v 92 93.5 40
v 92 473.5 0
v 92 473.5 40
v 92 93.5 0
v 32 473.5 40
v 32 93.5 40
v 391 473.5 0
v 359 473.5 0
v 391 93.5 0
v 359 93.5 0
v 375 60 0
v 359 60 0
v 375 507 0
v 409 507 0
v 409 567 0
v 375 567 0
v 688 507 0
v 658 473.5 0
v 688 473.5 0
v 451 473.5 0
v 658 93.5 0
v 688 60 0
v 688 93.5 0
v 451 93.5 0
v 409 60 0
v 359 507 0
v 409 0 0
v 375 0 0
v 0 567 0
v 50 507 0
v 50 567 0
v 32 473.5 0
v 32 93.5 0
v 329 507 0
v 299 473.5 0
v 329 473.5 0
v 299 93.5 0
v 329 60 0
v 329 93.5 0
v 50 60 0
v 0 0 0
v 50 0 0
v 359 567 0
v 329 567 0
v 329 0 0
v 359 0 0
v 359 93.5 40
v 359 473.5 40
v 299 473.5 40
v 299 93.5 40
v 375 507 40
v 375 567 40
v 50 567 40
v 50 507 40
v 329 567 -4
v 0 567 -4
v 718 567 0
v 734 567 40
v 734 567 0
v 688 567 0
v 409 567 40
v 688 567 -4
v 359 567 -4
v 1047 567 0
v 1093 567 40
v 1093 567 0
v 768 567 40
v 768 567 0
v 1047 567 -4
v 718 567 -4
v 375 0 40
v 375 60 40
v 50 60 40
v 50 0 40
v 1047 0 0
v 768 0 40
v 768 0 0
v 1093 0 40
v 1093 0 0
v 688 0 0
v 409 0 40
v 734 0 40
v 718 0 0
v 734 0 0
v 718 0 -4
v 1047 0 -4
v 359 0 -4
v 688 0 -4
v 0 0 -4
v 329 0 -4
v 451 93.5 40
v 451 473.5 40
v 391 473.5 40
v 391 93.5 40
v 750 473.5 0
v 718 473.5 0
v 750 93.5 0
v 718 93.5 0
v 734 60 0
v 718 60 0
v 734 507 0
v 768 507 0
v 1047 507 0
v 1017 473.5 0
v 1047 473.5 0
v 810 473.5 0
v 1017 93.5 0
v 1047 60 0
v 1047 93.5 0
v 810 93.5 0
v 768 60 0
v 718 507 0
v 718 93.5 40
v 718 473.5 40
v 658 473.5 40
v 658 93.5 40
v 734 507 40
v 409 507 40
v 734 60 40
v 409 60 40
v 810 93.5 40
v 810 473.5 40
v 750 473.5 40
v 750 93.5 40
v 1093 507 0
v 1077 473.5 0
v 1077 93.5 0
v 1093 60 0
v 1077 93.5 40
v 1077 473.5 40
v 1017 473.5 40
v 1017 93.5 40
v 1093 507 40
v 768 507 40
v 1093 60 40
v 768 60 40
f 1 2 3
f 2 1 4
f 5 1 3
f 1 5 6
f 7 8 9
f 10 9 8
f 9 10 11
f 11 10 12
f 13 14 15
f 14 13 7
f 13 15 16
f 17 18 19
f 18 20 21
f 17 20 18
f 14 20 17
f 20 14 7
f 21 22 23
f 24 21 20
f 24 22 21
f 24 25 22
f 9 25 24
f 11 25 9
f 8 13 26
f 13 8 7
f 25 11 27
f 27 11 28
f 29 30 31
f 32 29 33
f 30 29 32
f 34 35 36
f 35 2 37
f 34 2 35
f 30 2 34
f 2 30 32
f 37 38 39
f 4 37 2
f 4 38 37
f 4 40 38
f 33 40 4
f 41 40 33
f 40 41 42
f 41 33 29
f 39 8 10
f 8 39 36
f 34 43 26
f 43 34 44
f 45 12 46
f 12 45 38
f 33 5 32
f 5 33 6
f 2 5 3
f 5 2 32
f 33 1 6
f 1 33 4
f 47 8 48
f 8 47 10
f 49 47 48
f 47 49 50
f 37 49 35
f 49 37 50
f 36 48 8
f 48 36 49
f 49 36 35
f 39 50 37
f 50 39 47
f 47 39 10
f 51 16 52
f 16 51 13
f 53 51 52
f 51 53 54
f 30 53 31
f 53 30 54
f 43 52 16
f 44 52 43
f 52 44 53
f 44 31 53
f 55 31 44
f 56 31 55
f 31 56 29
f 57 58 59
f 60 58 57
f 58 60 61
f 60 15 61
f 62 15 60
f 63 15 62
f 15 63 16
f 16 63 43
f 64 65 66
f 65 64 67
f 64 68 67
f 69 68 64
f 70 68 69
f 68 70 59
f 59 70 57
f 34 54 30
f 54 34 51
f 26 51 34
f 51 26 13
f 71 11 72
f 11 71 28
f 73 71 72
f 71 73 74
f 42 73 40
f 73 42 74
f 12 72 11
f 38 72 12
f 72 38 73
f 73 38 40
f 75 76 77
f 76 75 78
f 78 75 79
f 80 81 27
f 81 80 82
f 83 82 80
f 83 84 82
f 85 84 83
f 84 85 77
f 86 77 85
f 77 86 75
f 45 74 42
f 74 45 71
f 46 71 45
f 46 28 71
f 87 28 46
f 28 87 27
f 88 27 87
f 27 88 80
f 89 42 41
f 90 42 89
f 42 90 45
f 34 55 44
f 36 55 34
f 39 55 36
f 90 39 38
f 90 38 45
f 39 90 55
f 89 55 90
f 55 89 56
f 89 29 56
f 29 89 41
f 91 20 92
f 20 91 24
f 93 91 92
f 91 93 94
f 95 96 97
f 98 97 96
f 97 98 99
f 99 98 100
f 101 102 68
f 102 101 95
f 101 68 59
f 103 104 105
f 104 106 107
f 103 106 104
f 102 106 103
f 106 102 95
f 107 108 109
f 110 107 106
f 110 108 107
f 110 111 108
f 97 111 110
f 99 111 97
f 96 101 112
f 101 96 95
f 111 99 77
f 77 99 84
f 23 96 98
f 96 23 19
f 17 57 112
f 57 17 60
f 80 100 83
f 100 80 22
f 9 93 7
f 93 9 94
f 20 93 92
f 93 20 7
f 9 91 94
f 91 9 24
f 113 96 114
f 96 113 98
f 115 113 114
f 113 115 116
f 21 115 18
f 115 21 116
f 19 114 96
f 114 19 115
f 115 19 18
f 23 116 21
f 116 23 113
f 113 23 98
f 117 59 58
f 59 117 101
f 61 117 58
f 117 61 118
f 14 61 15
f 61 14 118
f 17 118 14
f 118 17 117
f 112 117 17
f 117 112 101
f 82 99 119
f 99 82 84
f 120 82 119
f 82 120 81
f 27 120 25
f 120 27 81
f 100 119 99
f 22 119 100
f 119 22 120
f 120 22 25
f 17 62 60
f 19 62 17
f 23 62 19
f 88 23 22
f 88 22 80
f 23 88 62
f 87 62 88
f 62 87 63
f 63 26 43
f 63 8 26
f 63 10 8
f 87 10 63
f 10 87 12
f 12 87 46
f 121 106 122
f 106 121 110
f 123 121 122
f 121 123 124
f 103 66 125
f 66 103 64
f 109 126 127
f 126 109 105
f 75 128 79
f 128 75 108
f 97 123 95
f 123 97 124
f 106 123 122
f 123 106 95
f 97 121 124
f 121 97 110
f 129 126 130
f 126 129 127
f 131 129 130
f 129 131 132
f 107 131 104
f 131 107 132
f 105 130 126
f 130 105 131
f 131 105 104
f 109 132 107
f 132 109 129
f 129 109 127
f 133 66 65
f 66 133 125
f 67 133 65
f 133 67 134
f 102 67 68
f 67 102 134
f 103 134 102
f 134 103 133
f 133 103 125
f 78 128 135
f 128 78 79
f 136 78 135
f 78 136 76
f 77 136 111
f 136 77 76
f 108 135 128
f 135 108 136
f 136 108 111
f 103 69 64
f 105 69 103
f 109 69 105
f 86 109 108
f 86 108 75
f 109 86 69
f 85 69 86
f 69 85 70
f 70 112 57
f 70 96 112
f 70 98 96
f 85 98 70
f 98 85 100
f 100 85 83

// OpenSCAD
// Schweißtisch geschlossen

p_h=4;
p_l=567;
p_b=329;

vkr_h=40;
vkr_l=380;
vkr_b=60;

vkrs_h=40;
vkrs_l=325; // <p_b 
vkrs_b=60;

overlap=50;
clear=2;
dist=30;

module mod() {
    // 1. bar
    translate([vkr_b/2+clear,(p_l-vkr_l)/2,0]) {
        color( "Yellow", 1.0 ) {
            cube([vkr_b,vkr_l,vkr_h], 0);
        };
    };
    
    // 2. bar
    translate([p_b-(vkr_b/2),(p_l-vkr_l)/2,0]) {
        color( "Lime", 1.0 ) {
            cube([vkr_b,vkr_l,vkr_h], 0);
        };
    };

    // 3. bar
    translate([overlap,p_l-vkrs_b,0]) {
        color( "ForestGreen", 1.0 ) {
            cube([vkrs_l,vkrs_b,vkrs_h], 0);
        };
    };
    
    // 4. bar
    translate([overlap,0,0]) {
        color( "Olive", 1.0 ) {
            cube([vkrs_l,vkrs_b,vkrs_h], 0);
        };
    };

    // Plate
    translate([0,0,-p_h]) {
        cube([p_b,p_l,p_h], 0);
    };
};

mod();

translate([p_b+dist,0,0]) {
    mod();
    
    translate([p_b+dist,0,0]) {
        mod();
    };
};
